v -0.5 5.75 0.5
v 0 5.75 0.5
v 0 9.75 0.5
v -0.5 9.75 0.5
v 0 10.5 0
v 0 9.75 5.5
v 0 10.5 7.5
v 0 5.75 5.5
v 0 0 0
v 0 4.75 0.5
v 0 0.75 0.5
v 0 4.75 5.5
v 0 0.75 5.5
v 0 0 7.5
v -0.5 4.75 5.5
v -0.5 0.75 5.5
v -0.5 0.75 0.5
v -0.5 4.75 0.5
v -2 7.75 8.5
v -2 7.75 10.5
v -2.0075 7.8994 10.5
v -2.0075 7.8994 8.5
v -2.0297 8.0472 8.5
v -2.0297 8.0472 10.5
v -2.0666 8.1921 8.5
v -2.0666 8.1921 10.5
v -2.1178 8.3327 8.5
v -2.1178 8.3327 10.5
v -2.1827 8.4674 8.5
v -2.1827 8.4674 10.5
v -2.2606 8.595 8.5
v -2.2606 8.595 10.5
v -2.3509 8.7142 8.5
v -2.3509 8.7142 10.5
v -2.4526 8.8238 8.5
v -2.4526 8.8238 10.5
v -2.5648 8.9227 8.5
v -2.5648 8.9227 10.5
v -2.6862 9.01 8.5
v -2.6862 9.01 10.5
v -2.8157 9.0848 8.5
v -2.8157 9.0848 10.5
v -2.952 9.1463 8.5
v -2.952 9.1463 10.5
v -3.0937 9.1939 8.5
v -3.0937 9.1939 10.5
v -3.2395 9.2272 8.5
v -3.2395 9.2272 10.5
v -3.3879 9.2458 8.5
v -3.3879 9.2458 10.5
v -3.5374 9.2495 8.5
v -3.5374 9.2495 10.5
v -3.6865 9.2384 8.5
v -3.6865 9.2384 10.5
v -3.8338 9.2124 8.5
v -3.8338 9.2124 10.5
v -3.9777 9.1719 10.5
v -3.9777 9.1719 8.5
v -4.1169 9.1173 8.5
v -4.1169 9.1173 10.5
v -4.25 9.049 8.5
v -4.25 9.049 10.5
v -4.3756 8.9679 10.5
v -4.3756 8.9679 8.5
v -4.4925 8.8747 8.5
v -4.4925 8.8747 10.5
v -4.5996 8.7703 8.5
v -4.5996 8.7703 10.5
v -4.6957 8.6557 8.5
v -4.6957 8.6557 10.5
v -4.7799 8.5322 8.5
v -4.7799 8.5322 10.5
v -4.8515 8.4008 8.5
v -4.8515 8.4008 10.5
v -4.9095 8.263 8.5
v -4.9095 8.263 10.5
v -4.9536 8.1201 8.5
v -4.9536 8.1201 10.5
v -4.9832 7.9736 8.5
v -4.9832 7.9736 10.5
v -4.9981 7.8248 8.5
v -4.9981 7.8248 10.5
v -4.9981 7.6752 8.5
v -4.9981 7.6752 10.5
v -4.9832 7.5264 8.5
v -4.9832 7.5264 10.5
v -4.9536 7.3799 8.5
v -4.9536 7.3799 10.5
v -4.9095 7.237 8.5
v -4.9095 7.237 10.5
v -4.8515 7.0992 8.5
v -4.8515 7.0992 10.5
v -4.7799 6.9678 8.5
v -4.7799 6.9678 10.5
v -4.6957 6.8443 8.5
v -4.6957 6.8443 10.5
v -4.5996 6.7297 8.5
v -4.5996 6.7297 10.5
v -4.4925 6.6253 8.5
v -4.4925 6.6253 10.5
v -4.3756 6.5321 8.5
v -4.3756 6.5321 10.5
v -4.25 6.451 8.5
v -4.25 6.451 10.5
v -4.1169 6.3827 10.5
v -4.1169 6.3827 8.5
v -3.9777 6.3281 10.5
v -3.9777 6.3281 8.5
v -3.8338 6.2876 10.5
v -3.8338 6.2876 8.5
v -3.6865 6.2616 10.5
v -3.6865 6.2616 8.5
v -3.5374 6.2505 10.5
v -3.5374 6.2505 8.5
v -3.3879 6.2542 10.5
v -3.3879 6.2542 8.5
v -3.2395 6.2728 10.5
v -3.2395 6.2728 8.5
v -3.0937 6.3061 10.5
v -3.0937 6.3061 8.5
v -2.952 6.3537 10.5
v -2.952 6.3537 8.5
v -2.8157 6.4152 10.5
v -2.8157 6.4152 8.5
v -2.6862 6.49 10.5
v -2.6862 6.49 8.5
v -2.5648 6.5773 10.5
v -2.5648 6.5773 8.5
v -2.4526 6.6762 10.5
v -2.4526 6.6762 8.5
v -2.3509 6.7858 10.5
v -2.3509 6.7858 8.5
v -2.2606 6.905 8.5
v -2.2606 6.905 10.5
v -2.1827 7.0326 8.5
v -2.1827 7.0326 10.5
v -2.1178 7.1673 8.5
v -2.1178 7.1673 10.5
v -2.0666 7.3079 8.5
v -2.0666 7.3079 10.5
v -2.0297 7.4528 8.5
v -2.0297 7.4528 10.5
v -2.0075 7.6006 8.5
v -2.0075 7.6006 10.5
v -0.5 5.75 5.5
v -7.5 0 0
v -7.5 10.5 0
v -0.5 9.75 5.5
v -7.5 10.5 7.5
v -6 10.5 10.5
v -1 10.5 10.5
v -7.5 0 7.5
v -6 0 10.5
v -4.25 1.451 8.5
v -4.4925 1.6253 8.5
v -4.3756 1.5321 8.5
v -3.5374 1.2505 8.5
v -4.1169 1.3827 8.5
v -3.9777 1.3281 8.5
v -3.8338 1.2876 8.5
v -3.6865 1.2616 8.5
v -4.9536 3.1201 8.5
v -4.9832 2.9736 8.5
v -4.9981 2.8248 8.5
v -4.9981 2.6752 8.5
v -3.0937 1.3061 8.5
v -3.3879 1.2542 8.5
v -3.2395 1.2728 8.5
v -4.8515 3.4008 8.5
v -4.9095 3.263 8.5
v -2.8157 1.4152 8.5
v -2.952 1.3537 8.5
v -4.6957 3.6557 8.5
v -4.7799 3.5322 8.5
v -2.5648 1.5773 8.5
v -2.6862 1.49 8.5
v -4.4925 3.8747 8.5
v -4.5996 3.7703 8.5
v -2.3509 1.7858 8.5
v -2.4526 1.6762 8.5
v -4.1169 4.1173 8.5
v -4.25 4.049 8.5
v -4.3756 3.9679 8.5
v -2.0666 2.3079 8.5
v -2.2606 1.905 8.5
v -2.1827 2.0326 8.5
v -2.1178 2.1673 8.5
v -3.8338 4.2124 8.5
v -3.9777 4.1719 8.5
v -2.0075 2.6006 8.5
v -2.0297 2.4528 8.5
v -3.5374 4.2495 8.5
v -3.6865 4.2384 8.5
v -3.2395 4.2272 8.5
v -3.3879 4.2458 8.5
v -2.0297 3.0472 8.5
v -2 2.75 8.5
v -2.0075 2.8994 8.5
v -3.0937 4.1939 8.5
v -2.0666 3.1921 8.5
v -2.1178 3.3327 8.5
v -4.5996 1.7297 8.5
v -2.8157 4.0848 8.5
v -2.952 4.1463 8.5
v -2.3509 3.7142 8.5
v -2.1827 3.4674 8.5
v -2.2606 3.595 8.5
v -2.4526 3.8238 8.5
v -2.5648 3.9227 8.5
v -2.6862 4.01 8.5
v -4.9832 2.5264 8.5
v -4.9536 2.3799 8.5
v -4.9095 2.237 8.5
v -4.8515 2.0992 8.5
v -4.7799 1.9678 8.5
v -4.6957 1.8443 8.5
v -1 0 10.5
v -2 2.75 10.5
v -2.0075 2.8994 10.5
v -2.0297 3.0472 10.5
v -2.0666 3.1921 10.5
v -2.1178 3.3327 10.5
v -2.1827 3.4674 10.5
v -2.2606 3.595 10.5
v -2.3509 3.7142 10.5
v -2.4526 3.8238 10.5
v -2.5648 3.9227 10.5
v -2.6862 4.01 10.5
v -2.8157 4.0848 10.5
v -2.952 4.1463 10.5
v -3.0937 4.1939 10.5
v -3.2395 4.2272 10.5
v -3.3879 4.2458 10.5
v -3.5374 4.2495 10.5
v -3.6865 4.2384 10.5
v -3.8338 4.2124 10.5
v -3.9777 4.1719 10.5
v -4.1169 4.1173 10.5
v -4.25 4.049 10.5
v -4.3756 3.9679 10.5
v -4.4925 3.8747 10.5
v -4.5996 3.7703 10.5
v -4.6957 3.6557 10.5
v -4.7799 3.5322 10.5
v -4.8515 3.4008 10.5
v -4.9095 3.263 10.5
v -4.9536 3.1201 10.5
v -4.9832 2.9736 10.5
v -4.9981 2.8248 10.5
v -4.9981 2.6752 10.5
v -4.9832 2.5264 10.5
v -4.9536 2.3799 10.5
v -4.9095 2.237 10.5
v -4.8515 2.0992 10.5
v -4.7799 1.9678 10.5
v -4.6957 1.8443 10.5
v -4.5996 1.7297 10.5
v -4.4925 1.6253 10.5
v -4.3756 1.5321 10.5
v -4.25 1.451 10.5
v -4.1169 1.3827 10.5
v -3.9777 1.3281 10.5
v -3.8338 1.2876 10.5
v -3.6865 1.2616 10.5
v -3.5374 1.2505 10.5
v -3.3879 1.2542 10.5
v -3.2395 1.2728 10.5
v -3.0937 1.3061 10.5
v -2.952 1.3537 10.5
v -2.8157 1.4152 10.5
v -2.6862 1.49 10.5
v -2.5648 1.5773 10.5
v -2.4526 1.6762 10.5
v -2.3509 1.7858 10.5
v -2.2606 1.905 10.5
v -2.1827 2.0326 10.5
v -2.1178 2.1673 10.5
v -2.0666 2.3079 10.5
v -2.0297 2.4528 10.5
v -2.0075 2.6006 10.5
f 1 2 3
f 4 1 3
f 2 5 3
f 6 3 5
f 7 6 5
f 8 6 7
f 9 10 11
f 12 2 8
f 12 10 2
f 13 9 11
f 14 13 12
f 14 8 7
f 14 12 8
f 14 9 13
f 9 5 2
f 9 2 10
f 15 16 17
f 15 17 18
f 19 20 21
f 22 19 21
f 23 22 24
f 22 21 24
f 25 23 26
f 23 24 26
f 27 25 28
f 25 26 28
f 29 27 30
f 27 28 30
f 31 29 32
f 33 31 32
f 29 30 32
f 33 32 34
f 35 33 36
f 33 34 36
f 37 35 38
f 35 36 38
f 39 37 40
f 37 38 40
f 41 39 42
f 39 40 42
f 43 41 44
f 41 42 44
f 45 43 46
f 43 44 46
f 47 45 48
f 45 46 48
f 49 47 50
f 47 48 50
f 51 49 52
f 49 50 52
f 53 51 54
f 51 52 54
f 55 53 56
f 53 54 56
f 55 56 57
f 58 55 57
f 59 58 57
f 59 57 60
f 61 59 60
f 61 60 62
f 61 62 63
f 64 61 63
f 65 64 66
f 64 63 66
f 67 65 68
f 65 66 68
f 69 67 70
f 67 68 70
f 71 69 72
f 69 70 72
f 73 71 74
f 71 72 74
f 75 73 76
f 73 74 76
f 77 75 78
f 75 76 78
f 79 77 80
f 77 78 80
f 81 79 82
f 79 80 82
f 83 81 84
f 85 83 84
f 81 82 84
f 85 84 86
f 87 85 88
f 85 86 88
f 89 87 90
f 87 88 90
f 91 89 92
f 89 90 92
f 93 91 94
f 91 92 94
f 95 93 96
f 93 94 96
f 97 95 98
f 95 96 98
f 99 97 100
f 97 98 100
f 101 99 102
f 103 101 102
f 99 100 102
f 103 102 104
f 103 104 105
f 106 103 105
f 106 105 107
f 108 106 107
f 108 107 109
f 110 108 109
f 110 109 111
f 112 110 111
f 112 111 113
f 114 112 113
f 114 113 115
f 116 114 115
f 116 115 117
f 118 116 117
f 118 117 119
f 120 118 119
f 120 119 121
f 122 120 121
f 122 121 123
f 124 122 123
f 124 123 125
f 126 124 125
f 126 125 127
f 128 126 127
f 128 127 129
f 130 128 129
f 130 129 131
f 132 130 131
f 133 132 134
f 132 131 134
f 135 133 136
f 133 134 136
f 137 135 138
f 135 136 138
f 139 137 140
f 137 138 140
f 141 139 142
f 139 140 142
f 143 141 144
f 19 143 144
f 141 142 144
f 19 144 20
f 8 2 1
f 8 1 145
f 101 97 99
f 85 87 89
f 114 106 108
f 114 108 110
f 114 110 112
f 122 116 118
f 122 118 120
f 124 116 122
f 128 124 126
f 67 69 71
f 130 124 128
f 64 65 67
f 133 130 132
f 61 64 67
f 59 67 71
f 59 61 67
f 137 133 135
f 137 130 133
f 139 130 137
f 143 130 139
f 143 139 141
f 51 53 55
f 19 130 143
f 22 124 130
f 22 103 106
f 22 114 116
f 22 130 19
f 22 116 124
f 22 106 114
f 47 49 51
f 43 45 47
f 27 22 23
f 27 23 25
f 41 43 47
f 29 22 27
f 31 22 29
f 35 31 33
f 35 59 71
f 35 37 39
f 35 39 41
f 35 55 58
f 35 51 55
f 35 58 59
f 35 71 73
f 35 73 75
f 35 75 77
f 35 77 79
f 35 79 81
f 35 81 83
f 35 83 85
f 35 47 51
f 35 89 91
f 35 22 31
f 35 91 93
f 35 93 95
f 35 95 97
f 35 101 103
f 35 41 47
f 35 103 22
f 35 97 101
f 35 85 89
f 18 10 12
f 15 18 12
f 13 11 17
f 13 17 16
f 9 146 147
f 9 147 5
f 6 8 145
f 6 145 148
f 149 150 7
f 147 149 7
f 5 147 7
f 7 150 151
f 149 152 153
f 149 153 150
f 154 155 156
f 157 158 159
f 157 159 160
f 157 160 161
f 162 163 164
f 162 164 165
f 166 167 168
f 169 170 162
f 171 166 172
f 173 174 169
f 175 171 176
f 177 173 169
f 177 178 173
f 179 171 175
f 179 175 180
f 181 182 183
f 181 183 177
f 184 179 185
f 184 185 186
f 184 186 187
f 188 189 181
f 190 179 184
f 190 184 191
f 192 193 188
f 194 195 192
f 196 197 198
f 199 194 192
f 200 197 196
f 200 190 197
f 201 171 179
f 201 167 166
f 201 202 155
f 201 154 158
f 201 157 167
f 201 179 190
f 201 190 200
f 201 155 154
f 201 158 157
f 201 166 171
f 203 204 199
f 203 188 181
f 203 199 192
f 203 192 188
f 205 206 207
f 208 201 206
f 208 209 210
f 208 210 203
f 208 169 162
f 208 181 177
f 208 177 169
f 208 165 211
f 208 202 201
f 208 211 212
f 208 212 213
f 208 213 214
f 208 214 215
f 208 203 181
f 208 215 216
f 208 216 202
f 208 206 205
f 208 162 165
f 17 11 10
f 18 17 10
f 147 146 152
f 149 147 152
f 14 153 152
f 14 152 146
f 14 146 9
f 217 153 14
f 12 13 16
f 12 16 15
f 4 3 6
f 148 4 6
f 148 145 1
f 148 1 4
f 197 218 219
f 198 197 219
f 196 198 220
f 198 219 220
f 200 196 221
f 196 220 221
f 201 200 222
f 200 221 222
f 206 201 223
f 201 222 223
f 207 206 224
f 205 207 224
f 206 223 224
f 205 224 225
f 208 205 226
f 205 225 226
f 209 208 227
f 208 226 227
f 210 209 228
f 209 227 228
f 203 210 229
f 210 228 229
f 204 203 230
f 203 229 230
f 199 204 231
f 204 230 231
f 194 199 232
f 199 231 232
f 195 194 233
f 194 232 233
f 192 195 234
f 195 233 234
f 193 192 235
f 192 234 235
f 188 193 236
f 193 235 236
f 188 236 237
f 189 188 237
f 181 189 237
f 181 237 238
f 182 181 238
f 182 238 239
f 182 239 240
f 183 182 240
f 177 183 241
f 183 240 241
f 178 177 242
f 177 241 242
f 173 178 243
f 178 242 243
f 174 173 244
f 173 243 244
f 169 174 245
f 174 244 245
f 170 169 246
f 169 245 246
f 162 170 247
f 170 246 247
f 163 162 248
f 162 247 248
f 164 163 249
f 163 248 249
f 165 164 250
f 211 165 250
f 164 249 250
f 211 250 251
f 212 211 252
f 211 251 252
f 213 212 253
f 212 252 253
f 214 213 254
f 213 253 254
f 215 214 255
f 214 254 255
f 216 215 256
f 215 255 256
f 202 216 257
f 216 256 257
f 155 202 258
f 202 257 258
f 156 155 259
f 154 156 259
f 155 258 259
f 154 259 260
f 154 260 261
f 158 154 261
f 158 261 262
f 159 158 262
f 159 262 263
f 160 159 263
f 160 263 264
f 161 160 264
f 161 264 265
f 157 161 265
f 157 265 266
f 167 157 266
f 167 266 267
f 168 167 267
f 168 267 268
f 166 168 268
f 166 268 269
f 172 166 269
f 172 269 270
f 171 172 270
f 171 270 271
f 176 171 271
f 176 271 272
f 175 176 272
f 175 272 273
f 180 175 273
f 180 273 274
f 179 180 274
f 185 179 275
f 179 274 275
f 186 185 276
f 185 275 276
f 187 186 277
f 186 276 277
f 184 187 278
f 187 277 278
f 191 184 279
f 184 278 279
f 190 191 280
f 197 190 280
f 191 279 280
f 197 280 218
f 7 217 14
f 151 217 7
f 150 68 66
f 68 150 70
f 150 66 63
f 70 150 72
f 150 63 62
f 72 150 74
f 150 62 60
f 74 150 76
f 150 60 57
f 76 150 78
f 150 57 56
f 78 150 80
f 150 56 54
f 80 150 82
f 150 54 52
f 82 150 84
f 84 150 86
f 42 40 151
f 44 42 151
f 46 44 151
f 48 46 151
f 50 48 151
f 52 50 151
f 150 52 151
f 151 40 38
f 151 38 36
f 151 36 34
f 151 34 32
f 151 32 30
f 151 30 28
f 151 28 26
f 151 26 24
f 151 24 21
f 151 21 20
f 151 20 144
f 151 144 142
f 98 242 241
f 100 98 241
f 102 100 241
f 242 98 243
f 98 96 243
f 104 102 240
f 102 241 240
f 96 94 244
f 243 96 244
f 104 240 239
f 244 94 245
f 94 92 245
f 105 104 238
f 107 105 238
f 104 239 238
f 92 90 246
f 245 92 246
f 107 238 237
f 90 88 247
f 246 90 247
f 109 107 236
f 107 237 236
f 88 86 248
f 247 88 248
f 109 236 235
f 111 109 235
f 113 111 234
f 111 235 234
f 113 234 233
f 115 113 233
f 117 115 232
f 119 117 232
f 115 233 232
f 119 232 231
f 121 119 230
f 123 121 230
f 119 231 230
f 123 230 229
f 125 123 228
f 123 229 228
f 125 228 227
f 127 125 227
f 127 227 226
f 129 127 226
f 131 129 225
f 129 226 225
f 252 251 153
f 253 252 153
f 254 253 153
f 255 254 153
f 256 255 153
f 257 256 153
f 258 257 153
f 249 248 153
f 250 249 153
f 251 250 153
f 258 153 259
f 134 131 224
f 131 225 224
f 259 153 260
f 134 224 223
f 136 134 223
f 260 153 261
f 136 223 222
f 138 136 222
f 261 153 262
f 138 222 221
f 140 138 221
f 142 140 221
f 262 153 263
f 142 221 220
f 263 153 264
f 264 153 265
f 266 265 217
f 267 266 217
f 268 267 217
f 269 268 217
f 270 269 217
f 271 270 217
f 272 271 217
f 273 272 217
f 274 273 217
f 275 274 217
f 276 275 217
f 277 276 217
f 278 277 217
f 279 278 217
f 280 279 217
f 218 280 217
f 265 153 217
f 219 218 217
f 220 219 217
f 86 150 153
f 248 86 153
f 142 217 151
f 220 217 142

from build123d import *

# Parameters (mm, degrees)
F0_W     = 7.5
F0_H     = 10.5
F1_DEPTH = 10.5
F2_SIZE2 = 3
F2_SIZE  = 1.5
F3_SIZE2 = 1
F3_SIZE  = 3
F4_R     = 1.5
F5_DEPTH = 2
F6_W     = 4
F6_H     = 5
F7_DEPTH = 0.5


with BuildPart() as f1:
    # F0 (on Front) → F1 (new body)
    with BuildSketch(Plane.XZ):
        with Locations((-3.75, 5.25)):
            Rectangle(F0_W, F0_H)
    extrude(amount=-F1_DEPTH)

    # F2
    f2_edges = [f1.edges().sort_by_distance(p)[0] for p in [
        (-7.5, 5.25, 10.5),
    ]]
    f2_side = f1.faces().sort_by_distance((-3.75, 5.25, 10.5))[0]
    chamfer(f2_edges, length=F2_SIZE, length2=F2_SIZE2, reference=f2_side)

    # F3
    f3_edges = [f1.edges().sort_by_distance(p)[0] for p in [
        (0, 5.25, 10.5),
    ]]
    f3_side = f1.faces().sort_by_distance((0, 5.25, 5.25))[0]
    chamfer(f3_edges, length=F3_SIZE, length2=F3_SIZE2, reference=f3_side)

    # F4 (on face) → F5 (cut)
    with BuildSketch(Plane.XY.offset(10.5)):
        with Locations((-3.5, 2.75)):
            Circle(F4_R)
        with Locations((-3.5, 7.75)):
            Circle(F4_R)
    extrude(amount=-F5_DEPTH, mode=Mode.SUBTRACT)

    # F6 (on face) → F7 (cut)
    with BuildSketch(Plane.YZ):
        with Locations((2.75, 3)):
            Rectangle(F6_W, F6_H)
        with Locations((7.75, 3)):
            Rectangle(F6_W, F6_H)
    extrude(amount=-F7_DEPTH, mode=Mode.SUBTRACT)


solid = f1.part
